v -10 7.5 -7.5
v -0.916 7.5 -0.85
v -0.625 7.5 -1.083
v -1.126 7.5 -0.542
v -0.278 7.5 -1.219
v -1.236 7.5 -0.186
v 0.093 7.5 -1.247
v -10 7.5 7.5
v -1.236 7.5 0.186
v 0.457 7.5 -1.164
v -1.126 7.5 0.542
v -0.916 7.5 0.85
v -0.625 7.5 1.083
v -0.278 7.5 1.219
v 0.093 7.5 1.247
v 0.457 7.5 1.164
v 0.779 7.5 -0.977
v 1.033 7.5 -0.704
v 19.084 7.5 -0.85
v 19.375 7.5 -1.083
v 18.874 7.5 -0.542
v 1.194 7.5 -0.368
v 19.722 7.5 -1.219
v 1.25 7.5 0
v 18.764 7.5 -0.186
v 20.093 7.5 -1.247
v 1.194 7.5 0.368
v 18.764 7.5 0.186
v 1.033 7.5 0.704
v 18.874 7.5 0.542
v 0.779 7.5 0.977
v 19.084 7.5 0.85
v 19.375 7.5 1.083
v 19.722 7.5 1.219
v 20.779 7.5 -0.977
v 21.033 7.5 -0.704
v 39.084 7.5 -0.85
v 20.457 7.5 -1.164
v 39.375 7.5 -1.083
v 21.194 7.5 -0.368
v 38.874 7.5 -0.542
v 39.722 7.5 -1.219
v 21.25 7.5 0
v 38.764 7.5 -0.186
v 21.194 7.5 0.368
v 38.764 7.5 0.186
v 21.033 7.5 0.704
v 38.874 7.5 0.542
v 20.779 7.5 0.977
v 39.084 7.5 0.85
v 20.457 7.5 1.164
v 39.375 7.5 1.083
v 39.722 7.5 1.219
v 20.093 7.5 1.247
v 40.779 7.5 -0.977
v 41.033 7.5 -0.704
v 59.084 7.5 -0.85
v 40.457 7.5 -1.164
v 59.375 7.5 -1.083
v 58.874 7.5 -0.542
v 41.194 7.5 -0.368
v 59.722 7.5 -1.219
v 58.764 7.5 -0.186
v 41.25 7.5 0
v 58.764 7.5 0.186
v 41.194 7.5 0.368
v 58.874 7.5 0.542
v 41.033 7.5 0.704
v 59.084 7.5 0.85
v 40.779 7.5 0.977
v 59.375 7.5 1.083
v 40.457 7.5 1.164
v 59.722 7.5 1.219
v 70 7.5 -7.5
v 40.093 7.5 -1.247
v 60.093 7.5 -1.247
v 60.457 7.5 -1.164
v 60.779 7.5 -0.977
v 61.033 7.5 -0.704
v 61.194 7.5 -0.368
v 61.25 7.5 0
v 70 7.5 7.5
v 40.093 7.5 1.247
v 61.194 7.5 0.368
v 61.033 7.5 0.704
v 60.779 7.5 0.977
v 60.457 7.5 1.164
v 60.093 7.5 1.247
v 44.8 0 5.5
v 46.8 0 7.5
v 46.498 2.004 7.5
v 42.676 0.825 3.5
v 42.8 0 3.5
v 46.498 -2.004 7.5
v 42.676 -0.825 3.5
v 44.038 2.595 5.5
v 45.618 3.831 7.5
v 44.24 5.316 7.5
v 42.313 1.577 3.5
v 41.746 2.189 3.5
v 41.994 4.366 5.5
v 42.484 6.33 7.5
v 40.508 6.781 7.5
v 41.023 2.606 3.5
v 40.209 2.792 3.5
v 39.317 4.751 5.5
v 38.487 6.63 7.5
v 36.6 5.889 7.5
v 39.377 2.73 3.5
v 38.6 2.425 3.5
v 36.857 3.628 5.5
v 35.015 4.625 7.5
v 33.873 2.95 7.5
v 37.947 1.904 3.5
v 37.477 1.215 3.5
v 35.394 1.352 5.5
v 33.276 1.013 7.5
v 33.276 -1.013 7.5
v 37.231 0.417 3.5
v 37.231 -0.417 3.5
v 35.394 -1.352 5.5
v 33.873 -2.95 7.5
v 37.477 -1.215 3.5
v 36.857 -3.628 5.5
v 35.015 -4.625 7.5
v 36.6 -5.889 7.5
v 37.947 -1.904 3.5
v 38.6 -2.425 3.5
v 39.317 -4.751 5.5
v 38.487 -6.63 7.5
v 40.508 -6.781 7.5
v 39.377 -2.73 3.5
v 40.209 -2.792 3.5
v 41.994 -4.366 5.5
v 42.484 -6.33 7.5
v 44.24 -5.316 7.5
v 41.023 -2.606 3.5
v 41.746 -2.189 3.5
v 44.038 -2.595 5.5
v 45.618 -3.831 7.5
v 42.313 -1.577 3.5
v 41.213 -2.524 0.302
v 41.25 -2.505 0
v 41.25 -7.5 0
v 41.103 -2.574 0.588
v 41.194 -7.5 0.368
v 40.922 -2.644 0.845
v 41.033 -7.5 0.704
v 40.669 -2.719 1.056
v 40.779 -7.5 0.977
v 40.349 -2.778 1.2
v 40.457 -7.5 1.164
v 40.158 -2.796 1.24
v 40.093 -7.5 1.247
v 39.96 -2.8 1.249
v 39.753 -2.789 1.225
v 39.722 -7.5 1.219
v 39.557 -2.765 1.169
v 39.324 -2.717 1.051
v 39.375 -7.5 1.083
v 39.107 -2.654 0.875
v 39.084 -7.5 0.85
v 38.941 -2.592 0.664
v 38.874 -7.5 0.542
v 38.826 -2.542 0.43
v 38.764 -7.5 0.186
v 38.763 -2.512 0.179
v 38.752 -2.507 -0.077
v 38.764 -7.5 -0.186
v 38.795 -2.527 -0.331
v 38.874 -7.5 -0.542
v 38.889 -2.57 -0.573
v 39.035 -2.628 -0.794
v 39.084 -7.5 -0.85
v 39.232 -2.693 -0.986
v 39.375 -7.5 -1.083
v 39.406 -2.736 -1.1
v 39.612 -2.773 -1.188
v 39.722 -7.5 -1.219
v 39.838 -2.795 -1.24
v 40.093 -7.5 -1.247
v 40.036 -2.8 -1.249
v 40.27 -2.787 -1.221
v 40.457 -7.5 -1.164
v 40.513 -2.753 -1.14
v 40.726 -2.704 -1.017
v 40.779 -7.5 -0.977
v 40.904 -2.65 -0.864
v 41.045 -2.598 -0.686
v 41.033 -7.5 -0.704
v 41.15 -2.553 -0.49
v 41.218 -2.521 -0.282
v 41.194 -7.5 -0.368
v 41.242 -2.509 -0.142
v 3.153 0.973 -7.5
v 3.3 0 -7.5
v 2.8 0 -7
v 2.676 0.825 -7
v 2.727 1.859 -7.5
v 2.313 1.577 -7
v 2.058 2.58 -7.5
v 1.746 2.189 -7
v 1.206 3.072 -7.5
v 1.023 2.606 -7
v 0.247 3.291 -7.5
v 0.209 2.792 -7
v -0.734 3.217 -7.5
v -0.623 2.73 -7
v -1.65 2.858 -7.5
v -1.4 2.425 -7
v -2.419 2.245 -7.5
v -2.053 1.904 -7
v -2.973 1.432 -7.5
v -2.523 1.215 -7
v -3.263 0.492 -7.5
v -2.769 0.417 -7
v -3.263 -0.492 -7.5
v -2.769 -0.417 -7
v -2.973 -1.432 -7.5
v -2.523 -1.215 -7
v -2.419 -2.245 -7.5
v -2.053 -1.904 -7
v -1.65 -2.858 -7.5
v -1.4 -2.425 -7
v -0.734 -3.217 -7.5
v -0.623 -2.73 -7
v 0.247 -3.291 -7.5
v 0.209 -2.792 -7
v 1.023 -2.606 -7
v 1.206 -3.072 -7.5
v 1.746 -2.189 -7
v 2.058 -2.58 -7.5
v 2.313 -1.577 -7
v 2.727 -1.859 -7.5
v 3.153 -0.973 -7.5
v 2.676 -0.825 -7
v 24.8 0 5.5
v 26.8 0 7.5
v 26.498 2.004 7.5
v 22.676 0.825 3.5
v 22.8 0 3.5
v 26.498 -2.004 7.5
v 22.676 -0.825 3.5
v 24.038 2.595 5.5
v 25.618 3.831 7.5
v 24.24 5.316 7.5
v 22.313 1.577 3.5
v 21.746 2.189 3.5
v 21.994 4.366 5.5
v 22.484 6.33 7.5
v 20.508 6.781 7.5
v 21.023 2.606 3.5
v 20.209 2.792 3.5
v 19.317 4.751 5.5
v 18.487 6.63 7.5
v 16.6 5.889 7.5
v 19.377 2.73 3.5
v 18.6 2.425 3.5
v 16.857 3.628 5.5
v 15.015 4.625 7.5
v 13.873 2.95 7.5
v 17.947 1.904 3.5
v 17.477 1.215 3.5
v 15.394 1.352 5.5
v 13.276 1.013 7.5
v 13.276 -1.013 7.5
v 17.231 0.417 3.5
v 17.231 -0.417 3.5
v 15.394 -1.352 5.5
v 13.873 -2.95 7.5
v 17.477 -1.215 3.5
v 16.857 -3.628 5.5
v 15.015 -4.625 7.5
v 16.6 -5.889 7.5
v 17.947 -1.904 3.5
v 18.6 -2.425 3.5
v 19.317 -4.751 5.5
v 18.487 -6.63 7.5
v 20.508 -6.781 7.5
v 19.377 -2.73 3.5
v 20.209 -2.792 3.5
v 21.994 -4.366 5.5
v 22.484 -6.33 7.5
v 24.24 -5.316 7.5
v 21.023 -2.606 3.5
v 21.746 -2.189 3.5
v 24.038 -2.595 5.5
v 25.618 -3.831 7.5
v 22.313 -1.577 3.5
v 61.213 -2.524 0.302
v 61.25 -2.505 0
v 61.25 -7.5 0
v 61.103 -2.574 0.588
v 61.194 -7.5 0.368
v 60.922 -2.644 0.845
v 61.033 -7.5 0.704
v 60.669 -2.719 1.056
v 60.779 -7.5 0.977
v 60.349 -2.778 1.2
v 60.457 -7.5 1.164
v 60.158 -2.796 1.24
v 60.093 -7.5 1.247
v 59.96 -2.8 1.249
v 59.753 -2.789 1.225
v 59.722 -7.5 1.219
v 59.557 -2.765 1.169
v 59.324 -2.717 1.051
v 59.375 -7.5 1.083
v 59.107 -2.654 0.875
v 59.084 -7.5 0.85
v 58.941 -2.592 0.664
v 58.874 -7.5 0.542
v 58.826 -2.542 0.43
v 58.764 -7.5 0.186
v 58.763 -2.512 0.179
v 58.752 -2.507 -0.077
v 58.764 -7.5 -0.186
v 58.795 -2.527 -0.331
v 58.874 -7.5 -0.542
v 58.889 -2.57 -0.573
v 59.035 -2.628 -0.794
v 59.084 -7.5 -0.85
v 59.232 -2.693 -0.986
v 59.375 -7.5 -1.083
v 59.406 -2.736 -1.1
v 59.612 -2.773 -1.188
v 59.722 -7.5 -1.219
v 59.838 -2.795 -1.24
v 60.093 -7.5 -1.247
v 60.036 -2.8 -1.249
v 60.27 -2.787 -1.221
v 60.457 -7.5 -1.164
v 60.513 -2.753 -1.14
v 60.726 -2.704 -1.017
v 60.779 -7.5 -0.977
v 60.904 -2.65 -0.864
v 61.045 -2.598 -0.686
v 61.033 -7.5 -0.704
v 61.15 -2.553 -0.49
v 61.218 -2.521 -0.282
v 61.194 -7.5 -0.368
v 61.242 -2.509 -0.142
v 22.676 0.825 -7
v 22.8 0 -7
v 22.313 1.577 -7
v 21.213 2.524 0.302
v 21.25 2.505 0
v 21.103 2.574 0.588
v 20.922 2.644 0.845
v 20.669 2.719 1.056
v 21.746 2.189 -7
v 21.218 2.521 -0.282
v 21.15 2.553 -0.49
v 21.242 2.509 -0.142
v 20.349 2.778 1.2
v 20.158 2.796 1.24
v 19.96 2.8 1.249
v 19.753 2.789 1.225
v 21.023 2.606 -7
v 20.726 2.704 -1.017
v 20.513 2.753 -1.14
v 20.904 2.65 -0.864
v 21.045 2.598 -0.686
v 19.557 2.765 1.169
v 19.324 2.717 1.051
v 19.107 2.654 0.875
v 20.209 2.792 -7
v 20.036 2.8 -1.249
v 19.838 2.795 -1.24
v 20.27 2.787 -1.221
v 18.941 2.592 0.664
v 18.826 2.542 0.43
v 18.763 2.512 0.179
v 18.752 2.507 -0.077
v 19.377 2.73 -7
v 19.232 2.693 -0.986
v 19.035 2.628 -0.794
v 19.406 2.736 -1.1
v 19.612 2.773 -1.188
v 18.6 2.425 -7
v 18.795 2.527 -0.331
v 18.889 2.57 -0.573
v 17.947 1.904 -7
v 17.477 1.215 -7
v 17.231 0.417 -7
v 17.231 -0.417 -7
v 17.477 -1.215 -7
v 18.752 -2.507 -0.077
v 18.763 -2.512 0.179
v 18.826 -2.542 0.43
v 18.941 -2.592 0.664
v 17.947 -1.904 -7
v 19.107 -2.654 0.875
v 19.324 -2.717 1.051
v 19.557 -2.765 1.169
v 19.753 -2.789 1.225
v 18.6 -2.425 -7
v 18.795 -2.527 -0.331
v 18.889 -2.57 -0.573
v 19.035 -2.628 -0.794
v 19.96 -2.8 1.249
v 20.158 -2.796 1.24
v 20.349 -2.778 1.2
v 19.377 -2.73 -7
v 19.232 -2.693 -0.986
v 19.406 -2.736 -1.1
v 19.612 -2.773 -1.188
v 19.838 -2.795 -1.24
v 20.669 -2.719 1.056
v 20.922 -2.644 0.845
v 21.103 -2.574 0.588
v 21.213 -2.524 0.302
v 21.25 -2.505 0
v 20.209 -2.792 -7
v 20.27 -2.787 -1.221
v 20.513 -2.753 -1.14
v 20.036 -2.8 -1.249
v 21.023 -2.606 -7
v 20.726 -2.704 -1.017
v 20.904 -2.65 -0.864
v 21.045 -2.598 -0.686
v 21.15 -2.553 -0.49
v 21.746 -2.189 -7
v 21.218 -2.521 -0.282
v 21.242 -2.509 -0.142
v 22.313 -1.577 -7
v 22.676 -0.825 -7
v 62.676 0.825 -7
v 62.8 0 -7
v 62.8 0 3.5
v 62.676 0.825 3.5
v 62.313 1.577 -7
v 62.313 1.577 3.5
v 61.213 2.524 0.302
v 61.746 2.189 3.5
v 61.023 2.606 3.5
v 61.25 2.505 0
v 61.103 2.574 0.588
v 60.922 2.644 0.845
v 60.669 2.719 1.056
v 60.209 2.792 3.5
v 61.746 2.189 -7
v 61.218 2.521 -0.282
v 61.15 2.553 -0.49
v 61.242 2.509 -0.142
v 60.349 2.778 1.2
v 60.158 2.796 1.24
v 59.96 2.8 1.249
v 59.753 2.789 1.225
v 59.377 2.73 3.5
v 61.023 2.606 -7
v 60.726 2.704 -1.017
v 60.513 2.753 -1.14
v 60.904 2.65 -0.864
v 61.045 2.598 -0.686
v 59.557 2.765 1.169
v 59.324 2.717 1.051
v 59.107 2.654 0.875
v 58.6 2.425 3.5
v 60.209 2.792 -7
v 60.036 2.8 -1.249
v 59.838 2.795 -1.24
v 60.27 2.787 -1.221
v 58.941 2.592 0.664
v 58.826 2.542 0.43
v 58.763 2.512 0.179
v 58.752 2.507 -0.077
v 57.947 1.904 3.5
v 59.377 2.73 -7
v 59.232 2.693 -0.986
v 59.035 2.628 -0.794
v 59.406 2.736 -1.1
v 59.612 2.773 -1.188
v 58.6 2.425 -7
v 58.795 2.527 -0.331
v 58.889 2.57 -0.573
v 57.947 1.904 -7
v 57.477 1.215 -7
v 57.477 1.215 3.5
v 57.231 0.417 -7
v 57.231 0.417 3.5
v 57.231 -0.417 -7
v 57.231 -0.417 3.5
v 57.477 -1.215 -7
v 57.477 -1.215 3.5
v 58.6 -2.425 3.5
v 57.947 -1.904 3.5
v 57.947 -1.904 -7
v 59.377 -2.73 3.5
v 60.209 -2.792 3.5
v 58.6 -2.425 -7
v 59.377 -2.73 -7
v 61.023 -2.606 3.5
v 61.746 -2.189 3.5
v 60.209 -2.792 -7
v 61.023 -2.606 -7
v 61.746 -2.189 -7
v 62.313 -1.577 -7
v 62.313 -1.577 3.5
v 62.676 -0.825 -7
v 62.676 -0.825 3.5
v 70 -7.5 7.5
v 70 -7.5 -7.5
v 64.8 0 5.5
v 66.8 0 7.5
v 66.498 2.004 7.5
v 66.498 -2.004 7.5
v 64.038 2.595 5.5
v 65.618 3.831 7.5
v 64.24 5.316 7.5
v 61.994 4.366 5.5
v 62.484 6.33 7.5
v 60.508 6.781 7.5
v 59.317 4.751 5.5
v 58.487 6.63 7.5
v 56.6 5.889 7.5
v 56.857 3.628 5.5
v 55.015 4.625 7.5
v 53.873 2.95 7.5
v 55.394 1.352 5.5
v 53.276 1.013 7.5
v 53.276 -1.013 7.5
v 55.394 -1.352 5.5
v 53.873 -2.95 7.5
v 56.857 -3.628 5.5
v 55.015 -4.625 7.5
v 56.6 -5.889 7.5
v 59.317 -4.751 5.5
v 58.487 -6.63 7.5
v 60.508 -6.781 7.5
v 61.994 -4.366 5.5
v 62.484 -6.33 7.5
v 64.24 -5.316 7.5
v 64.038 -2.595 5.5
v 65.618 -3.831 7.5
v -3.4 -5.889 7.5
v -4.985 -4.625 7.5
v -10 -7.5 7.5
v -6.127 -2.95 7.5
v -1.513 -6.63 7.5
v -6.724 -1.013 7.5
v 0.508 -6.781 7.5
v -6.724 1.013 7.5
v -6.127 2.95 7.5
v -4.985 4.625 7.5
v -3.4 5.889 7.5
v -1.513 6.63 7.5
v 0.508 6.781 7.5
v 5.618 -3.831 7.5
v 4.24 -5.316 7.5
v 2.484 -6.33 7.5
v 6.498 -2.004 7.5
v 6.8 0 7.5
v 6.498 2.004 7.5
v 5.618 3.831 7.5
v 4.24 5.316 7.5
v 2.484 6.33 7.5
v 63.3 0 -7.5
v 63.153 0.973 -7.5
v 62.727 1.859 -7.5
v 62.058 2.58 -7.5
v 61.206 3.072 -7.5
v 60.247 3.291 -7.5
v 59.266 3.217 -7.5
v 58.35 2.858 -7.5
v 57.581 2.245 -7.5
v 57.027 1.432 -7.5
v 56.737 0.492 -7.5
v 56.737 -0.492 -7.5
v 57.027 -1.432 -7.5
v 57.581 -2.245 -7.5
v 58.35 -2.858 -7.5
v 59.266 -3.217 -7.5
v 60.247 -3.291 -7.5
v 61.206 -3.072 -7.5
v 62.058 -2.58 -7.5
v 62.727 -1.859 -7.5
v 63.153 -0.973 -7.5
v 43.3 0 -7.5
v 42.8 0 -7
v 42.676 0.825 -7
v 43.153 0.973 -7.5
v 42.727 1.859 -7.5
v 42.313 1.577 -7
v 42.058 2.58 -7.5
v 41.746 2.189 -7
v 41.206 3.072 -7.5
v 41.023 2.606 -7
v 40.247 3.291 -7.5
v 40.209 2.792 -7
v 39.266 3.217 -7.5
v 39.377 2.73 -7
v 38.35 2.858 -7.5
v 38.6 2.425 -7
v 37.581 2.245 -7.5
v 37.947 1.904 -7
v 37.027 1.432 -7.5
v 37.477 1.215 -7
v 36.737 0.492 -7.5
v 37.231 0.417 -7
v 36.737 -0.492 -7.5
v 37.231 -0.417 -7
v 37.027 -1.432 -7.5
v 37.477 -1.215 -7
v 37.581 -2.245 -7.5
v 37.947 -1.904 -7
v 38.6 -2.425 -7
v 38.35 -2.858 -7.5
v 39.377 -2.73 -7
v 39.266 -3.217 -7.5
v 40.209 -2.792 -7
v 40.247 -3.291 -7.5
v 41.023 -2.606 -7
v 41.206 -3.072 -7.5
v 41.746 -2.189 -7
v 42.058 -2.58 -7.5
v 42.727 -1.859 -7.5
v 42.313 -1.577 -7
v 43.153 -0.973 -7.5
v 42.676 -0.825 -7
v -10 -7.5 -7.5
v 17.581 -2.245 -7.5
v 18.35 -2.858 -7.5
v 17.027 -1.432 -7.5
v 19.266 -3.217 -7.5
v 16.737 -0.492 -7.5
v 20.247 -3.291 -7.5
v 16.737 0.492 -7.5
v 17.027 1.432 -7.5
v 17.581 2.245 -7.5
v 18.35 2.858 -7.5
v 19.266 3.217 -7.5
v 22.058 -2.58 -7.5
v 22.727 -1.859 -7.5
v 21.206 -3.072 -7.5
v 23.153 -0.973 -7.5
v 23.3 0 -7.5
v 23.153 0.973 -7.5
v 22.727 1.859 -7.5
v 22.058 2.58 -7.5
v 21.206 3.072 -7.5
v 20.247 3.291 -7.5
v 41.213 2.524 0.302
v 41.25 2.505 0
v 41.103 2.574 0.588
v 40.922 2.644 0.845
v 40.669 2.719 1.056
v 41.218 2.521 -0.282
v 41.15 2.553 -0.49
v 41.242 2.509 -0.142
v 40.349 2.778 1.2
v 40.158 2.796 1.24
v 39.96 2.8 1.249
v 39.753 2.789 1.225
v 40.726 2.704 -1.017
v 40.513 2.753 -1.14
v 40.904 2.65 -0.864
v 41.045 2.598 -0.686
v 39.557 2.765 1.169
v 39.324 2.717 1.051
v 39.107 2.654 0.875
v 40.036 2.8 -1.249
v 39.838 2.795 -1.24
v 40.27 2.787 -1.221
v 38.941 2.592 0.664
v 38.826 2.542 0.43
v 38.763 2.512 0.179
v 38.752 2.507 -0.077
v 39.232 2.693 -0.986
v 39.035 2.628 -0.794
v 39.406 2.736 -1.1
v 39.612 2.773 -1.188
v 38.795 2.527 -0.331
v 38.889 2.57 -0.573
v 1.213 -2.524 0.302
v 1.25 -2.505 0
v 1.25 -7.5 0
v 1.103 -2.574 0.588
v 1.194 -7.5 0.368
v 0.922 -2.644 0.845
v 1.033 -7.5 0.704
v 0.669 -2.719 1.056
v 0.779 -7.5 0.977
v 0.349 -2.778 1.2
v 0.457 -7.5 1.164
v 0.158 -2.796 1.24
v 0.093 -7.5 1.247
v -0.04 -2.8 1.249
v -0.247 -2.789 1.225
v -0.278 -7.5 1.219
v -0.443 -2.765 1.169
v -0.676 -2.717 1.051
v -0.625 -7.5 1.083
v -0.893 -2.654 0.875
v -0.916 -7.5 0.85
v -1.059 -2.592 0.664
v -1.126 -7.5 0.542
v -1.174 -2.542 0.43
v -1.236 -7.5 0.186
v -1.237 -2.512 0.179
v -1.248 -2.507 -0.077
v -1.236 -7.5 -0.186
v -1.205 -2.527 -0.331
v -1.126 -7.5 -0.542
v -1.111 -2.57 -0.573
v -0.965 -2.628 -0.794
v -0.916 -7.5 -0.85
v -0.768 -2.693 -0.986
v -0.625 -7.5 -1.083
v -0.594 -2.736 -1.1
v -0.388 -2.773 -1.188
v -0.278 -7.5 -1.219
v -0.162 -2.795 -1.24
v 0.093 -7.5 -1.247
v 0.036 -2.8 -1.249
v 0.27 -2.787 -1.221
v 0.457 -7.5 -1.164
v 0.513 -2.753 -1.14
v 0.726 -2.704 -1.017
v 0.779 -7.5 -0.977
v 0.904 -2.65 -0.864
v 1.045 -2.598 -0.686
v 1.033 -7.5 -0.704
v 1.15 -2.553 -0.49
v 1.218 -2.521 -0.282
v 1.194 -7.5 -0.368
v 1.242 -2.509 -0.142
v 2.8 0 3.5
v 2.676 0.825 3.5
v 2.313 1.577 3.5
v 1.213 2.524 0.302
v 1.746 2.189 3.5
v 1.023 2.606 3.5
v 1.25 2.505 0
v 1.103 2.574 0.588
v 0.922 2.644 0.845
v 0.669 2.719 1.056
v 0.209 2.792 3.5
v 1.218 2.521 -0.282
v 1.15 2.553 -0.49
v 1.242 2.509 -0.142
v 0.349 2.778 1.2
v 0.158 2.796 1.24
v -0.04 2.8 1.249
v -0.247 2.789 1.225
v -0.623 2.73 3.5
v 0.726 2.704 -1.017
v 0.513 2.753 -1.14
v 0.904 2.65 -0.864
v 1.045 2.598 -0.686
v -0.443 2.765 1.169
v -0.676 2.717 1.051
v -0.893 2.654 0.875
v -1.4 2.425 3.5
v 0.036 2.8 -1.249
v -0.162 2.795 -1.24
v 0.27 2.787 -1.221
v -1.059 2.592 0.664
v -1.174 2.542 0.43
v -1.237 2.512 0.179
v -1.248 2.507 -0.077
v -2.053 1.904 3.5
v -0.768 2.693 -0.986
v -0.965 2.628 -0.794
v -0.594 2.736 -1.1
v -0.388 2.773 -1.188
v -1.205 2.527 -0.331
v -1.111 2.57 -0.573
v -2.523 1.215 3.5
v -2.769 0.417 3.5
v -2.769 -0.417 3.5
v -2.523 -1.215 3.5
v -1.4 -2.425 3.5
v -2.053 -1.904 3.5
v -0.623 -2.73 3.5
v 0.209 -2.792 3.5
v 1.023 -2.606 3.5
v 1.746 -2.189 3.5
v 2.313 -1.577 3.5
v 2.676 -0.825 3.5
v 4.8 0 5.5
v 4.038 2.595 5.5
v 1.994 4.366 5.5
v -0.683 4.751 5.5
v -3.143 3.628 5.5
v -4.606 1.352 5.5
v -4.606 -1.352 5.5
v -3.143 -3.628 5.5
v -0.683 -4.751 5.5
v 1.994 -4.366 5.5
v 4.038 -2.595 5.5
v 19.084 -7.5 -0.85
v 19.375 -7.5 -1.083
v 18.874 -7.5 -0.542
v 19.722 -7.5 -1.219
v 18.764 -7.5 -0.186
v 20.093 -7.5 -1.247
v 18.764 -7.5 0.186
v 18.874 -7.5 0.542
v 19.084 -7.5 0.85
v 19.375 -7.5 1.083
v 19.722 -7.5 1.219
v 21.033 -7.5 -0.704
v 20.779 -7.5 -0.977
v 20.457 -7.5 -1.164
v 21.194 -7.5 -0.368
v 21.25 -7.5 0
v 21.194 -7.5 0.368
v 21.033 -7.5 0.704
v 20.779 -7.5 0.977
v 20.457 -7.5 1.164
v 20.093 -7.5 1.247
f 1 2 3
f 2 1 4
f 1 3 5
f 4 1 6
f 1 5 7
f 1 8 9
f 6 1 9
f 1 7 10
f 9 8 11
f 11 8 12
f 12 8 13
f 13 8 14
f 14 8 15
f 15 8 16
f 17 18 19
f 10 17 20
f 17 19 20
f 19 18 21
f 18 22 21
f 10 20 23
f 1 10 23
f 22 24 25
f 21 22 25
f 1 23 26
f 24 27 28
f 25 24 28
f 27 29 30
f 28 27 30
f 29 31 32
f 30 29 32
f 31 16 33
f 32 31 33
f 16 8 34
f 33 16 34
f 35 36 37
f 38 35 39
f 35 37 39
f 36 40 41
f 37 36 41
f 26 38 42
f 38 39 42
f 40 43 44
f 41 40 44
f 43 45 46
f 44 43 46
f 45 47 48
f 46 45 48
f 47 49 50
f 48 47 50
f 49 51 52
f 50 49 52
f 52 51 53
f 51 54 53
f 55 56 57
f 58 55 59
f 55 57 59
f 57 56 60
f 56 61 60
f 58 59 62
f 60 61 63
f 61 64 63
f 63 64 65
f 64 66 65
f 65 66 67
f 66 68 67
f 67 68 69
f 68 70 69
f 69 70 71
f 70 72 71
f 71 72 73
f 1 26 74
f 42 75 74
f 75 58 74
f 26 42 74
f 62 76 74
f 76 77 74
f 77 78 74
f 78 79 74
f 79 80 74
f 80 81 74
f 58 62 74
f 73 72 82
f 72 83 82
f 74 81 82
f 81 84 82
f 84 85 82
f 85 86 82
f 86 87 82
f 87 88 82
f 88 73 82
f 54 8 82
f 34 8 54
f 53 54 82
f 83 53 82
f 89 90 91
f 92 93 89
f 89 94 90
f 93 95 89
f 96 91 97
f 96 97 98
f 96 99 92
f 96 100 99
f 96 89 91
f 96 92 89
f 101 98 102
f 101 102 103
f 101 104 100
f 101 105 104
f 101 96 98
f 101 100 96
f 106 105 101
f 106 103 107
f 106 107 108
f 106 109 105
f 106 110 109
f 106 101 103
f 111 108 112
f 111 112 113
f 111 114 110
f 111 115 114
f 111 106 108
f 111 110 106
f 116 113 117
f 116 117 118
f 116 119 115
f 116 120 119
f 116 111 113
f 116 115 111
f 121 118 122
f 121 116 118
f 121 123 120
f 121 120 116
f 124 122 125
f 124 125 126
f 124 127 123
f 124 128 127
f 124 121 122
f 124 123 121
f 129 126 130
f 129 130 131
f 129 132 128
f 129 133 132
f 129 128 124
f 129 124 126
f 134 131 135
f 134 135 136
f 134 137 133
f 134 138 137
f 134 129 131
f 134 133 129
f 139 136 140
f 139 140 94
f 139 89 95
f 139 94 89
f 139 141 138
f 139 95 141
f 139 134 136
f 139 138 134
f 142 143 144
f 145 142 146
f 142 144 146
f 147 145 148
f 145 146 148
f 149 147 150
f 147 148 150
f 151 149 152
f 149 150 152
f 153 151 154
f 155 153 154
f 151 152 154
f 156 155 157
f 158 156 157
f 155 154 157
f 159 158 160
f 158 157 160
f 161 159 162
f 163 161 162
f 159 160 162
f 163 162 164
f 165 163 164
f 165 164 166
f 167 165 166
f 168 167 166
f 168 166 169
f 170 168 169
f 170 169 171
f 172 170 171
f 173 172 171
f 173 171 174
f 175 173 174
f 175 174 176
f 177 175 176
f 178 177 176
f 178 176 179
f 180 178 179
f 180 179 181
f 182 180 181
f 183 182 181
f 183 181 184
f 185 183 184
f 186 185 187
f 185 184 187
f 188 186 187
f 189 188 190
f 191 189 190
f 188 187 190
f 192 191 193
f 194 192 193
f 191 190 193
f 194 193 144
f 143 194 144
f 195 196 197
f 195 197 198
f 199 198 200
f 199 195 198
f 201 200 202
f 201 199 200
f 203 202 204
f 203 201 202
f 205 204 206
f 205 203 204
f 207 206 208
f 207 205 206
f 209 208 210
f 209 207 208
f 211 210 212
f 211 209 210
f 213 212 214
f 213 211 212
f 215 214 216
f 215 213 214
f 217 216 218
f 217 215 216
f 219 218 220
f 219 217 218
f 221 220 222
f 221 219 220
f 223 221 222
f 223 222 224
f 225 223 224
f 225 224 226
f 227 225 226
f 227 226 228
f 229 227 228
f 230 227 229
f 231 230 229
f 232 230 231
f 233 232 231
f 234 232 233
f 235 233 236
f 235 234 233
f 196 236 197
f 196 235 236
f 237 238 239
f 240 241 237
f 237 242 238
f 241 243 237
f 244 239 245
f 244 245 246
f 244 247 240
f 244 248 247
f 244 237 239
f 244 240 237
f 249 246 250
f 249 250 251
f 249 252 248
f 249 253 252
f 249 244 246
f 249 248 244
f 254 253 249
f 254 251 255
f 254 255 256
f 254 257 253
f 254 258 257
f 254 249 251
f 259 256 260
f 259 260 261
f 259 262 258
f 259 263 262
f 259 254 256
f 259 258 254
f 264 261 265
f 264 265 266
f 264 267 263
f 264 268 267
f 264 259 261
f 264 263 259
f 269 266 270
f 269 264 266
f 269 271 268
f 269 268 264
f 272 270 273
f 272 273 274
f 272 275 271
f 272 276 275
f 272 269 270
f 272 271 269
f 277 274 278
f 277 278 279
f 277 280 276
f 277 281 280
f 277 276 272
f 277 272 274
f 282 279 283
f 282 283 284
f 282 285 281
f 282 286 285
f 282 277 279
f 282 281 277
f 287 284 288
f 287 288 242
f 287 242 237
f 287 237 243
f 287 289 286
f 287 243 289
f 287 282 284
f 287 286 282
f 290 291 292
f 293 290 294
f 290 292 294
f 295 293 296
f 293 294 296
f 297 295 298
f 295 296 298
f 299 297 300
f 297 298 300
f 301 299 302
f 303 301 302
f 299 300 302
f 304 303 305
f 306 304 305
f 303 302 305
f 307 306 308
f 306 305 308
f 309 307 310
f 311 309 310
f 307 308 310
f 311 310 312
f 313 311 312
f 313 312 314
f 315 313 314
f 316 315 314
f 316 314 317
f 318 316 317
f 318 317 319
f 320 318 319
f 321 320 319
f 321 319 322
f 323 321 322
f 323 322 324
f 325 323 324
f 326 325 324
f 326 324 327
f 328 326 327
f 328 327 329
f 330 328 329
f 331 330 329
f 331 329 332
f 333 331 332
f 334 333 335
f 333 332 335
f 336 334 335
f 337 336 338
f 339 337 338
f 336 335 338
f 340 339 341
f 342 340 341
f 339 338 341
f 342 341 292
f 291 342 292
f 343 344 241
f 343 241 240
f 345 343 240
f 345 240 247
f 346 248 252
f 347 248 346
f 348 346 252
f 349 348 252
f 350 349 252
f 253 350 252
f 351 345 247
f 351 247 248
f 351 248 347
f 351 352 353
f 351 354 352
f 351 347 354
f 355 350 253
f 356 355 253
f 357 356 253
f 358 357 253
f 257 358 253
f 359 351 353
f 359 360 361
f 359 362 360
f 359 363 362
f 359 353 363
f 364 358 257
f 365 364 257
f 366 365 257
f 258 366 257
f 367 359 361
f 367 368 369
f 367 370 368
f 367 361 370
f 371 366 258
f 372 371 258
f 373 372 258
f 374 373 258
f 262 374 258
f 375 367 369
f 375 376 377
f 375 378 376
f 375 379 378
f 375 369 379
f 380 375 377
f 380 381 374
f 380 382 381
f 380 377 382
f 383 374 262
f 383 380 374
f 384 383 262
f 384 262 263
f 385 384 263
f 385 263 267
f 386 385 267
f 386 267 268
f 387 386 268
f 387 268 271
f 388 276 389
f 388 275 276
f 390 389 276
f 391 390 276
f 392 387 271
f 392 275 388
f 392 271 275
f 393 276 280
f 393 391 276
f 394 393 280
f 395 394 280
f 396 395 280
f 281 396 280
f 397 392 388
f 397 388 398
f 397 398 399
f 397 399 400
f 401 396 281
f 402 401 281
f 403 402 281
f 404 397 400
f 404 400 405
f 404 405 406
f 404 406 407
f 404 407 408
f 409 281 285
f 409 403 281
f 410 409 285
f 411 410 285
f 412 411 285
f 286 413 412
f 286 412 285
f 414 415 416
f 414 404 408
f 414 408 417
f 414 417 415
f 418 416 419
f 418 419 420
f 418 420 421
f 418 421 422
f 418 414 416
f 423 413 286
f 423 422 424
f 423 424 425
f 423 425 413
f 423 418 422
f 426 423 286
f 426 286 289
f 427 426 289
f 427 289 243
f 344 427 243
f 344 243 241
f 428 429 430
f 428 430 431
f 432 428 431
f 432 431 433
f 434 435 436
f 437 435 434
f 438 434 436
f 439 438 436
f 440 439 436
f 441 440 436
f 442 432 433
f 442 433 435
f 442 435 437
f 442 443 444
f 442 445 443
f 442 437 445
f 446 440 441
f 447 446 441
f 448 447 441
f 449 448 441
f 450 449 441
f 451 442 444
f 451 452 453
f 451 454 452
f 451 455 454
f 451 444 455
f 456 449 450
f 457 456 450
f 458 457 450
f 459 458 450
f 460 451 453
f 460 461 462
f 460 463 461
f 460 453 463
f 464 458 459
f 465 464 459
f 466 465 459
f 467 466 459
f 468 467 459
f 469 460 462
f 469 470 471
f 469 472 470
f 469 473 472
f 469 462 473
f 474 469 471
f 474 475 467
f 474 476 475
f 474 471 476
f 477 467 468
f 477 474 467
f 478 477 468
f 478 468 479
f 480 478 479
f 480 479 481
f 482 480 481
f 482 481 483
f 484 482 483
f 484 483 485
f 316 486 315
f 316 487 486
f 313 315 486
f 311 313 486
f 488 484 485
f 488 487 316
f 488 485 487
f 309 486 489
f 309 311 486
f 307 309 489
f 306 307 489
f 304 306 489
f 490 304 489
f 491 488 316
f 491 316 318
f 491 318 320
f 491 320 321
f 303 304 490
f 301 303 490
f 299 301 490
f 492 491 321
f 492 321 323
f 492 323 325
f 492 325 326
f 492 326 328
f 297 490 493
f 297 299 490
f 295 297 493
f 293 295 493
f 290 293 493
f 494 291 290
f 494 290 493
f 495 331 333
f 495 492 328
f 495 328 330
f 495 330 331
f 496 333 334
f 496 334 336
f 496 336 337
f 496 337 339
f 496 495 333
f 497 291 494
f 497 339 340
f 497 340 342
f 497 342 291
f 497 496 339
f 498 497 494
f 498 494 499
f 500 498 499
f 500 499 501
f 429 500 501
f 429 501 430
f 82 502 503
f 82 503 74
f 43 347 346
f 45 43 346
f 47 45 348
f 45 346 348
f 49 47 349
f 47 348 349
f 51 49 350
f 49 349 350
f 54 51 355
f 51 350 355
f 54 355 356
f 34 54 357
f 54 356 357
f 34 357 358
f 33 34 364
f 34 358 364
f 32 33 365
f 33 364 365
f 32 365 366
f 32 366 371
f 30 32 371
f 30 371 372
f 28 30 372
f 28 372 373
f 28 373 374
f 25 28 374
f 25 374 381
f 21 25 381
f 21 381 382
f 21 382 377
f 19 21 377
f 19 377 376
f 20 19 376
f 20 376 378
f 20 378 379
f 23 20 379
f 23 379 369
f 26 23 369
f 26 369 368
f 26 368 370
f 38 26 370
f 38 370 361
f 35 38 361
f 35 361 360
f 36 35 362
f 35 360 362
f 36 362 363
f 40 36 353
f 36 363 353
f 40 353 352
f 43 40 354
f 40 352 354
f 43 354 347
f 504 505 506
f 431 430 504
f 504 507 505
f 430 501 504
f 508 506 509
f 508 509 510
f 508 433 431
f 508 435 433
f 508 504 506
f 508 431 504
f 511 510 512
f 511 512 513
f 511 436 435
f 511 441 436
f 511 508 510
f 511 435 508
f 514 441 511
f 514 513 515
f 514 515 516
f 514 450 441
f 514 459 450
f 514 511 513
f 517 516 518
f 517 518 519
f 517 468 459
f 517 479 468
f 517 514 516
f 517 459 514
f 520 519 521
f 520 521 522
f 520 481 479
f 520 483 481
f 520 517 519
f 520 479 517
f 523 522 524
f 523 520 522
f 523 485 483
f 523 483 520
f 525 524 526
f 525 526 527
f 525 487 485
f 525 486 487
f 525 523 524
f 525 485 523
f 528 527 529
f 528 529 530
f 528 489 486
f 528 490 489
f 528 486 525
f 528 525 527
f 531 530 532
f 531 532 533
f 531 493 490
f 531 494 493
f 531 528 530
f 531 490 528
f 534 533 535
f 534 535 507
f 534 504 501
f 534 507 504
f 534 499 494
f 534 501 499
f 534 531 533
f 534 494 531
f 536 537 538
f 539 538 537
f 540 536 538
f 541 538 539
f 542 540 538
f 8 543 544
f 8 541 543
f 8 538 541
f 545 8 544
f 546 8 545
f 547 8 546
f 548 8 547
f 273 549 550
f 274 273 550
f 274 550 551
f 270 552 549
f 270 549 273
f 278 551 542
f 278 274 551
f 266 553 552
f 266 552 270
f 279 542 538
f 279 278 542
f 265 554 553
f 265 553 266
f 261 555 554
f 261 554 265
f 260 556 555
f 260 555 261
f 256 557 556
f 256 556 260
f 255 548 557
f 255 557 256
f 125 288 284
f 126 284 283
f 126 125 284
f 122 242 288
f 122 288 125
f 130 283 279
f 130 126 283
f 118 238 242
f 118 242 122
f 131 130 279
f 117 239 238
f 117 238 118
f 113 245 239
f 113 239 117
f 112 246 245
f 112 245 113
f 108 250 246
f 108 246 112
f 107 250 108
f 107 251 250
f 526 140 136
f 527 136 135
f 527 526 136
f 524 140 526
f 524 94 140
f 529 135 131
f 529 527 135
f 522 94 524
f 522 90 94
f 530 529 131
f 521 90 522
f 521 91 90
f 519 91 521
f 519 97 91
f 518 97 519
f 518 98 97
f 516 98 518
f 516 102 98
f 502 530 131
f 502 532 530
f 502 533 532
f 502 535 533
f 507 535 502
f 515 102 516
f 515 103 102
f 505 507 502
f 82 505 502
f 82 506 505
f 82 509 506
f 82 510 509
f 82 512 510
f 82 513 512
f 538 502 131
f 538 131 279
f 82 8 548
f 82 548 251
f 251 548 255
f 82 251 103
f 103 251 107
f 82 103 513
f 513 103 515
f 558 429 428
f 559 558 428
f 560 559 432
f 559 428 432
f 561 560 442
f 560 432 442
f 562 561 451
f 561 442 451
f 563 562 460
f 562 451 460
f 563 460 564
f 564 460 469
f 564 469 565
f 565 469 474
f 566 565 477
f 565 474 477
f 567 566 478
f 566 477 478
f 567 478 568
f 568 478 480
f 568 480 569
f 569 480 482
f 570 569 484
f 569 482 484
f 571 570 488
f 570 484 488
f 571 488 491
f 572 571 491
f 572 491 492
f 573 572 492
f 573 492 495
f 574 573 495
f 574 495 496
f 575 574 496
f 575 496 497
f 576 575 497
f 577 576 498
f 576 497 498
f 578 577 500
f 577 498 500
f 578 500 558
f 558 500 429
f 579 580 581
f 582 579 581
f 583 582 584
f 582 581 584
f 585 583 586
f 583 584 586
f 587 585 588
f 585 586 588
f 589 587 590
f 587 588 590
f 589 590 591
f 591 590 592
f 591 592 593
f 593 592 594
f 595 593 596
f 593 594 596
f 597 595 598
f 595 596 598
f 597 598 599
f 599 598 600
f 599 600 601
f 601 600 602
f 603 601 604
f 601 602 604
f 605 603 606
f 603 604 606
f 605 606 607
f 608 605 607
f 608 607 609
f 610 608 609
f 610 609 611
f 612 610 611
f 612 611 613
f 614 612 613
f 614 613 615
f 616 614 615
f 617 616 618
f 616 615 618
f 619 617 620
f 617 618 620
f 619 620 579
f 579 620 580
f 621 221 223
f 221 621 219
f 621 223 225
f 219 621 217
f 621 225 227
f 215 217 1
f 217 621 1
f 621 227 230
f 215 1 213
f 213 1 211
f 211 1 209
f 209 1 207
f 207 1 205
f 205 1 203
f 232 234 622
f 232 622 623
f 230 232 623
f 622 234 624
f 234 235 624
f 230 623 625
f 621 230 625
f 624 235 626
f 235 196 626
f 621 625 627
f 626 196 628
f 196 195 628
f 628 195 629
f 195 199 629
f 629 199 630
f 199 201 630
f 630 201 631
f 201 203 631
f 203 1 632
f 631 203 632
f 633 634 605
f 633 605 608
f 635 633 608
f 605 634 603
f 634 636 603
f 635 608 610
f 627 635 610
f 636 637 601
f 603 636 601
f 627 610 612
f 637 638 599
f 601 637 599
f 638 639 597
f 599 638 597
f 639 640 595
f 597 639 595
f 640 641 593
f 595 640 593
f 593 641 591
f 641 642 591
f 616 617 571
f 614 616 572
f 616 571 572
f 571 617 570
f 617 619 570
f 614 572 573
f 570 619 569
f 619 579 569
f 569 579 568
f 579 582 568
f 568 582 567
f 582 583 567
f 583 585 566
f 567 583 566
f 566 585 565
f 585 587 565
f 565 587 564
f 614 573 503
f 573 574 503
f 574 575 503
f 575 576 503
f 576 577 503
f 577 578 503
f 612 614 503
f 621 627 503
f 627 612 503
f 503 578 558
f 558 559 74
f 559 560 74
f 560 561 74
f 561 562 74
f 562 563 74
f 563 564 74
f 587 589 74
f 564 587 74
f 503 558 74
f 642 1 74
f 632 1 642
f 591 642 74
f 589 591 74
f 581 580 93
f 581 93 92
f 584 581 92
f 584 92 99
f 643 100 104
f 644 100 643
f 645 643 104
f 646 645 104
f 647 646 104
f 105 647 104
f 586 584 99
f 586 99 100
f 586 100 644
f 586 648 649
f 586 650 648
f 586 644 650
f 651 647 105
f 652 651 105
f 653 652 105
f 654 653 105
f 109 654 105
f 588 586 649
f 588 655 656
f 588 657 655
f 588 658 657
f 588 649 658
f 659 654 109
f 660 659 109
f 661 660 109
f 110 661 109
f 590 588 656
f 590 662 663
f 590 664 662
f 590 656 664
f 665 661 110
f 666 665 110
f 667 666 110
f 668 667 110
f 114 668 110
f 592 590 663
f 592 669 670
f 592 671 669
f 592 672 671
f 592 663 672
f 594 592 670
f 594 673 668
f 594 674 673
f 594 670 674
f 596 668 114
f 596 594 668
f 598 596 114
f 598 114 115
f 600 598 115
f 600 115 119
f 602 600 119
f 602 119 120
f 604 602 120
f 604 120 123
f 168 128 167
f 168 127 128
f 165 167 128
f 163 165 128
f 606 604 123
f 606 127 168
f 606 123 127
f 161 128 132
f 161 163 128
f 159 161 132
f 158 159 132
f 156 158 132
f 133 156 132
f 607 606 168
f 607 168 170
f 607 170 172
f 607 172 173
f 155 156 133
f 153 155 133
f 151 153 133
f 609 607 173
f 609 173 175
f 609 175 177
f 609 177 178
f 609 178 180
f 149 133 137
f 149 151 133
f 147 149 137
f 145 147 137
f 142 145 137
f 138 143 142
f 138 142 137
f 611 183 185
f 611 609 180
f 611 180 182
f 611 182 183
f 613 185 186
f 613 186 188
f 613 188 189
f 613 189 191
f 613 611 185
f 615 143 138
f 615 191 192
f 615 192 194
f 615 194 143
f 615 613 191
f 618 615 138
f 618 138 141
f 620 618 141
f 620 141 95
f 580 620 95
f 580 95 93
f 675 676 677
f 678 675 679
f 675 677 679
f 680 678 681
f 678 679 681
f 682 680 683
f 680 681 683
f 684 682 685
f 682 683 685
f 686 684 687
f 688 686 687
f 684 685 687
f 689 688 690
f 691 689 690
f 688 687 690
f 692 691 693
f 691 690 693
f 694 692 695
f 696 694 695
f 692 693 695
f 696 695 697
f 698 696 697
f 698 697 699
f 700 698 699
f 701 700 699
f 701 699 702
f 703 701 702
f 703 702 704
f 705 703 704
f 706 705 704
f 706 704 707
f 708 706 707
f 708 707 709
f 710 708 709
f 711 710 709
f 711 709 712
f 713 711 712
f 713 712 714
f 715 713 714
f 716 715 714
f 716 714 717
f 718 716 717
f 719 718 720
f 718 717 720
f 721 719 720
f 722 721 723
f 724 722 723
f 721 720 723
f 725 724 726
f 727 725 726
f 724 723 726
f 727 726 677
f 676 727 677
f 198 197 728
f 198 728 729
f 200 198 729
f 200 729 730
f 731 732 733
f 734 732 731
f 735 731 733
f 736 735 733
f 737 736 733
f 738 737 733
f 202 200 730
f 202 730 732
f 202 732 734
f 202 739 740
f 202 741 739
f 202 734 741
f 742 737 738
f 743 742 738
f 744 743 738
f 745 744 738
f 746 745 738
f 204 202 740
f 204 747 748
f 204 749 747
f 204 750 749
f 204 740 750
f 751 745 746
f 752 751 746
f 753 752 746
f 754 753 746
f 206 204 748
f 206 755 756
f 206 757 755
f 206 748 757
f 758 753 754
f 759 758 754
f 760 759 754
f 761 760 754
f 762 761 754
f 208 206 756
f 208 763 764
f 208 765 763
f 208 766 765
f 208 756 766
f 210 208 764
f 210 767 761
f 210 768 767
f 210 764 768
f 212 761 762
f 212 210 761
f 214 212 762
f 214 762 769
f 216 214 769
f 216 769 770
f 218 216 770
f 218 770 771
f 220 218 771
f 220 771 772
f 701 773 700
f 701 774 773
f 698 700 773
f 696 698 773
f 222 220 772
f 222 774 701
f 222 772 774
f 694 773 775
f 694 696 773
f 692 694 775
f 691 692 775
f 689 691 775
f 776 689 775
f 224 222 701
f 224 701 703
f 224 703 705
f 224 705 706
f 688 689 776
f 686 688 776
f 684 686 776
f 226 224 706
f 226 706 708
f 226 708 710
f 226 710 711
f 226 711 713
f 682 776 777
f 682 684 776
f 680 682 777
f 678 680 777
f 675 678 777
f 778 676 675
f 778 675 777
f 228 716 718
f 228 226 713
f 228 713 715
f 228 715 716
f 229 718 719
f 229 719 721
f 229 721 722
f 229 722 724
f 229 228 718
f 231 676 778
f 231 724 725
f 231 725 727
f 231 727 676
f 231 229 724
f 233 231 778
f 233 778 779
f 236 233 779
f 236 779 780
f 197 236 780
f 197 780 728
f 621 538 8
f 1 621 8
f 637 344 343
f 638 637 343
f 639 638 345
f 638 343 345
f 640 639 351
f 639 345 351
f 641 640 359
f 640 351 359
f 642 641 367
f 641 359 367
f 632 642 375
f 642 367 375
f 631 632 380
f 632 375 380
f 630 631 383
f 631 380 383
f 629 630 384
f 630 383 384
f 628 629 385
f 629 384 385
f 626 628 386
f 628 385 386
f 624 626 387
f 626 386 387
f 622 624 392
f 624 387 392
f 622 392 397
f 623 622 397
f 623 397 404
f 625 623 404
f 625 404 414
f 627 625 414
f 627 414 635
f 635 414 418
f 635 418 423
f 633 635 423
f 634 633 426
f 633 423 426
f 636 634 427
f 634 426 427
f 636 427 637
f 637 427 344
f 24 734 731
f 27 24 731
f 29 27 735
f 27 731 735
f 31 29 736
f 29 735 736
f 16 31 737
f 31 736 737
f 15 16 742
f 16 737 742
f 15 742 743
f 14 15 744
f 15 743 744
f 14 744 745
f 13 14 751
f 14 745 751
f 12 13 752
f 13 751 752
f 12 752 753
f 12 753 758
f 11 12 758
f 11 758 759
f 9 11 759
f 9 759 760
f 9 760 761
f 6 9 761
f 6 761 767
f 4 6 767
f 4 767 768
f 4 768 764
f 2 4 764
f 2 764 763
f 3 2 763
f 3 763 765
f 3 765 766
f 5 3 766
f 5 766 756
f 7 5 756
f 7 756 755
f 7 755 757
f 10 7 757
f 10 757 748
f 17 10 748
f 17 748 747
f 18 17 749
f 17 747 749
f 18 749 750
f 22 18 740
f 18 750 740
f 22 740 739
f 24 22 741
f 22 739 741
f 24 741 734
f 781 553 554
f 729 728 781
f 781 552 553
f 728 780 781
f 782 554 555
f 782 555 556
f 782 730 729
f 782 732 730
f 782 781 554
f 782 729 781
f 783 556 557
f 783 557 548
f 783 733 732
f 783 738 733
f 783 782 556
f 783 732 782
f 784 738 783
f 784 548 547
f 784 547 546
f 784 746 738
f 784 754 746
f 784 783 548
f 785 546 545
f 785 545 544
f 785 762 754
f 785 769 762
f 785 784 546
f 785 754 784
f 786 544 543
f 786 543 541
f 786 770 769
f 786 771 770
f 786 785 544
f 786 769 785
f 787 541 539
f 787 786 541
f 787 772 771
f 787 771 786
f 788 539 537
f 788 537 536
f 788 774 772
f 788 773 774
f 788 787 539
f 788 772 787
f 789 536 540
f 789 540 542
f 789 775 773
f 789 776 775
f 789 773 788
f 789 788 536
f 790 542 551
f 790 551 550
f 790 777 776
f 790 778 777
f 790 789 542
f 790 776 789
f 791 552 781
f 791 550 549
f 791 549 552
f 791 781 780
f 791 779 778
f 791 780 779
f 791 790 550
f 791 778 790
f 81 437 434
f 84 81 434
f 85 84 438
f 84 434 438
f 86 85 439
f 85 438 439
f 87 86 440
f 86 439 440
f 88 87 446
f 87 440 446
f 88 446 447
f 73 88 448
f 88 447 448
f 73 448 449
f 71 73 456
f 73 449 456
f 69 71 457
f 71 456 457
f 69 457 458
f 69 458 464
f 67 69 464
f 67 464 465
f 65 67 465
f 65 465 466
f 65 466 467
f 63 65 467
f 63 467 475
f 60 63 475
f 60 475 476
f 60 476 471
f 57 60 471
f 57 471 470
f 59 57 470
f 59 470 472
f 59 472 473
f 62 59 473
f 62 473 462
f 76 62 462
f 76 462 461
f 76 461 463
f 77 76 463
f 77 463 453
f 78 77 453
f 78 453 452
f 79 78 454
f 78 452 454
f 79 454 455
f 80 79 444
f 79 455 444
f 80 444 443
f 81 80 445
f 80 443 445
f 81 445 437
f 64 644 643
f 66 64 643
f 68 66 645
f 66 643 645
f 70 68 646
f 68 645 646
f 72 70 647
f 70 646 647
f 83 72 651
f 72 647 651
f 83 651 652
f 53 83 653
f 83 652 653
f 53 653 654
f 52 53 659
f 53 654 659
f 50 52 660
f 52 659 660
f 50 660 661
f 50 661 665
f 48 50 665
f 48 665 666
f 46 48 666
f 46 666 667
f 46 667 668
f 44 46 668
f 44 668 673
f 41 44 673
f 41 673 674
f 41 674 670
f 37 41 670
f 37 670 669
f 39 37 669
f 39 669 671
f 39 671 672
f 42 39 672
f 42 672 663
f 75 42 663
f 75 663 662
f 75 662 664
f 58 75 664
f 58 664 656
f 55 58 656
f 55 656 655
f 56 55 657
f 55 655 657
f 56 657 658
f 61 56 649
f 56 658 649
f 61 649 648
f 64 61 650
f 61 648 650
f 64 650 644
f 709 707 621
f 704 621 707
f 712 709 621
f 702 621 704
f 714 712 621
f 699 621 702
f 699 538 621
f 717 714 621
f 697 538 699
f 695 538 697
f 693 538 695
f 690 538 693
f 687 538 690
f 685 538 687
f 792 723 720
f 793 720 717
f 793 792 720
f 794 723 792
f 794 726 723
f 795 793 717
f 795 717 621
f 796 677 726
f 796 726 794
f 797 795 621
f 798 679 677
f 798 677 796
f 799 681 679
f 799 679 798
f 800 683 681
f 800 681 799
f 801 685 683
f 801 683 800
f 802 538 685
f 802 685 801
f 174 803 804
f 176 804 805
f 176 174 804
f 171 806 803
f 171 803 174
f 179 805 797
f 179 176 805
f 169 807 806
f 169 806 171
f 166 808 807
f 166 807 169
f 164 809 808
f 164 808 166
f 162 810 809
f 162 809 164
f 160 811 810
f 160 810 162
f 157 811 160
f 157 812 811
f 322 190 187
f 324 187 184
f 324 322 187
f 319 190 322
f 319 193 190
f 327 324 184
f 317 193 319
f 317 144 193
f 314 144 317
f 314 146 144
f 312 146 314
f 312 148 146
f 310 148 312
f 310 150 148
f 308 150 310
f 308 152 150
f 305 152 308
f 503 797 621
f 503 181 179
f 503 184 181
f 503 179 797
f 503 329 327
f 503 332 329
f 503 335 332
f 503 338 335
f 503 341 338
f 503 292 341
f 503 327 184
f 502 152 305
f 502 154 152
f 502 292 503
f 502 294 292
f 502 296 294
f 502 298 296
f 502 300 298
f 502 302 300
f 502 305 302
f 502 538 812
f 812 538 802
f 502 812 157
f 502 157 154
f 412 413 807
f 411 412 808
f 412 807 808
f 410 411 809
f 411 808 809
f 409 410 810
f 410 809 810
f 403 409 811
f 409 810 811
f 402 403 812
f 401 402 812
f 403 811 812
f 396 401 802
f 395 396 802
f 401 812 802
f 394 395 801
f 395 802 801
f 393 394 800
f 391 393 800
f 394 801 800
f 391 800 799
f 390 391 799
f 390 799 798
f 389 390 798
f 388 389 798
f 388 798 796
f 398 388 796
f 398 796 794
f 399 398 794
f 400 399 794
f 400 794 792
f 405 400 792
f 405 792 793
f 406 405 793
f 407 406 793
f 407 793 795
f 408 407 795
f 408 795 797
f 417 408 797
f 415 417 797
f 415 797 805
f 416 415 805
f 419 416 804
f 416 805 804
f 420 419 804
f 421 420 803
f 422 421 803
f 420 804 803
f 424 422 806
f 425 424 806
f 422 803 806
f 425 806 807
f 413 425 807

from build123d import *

# Parameters (mm, degrees)
F0_W     = 80
F0_H     = 15
F0_R     = 2.8
F1_DEPTH = 7.5
F2_SIZE  = 4
F3_SIZE  = 0.5
F5_D     = 2.5


with BuildPart() as f1:
    # F0 (on Top) → F1 (new body, symmetric)
    with BuildSketch(Plane.XY):
        with Locations((30, 0)):
            Rectangle(F0_W, F0_H)
        Circle(F0_R, mode=Mode.SUBTRACT)
        with Locations((20, 0)):
            Circle(F0_R, mode=Mode.SUBTRACT)
        with Locations((40, 0)):
            Circle(F0_R, mode=Mode.SUBTRACT)
        with Locations((60, 0)):
            Circle(F0_R, mode=Mode.SUBTRACT)
    extrude(amount=F1_DEPTH, both=True)

    # F2
    f2_edges = [f1.edges().sort_by_distance(p)[0] for p in [
        (-2.8, 0, 7.5),
        (17.2, 0, 7.5),
        (37.2, 0, 7.5),
        (57.2, 0, 7.5),
    ]]
    chamfer(f2_edges, length=F2_SIZE)

    # F3
    f3_edges = [f1.edges().sort_by_distance(p)[0] for p in [
        (57.2, 0, -7.5),
        (37.2, 0, -7.5),
        (17.2, 0, -7.5),
        (-2.8, 0, -7.5),
    ]]
    chamfer(f3_edges, length=F3_SIZE)

    # F5 (through all)
    with Locations(Plane(origin=(0, 7.5, 0), x_dir=(-1, 0, 0), z_dir=(0, 1, 0))):
        with Locations((-60, 0), (-40, 0), (-20, 0), (0, 0)):
            Hole(F5_D / 2)


solid = f1.part
